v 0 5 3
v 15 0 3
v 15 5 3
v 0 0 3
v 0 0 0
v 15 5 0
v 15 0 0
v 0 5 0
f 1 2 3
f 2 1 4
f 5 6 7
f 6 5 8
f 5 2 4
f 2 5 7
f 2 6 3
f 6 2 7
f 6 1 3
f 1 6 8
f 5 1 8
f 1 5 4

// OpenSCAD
// Generated by SolidPython 1.0.1 on 2020-07-29 00:46:55


cube(size = [15, 5, 3]);
/***********************************************
*********      SolidPython code:      **********
************************************************
 
# import packages: SolidPython
from solid import *
from solid.utils import *
from itertools import chain, combinations, permutations


class Resize:

    def __init__(self, scad_file):
        self.scad_file = scad_file
        #self.scad_file = import_scad(scad_file)
        # cone/cylinder param:
        self.r1 = 0
        self.r2 = 0
        self.h = 0
        # rectangular prism param:
        self.w = 0
        self.l = 0
        # ellipse param:
        self.r = 0

    # import OpenScad code (file name corresponds to shape)


    # classify shape + parameters
    def assign(self, param1, param2, param3):
        if self.scad_file == 'cone.scad':
            self.r1 = param1
            self.r2 = param2
            self.h = param3
        elif self.scad_file == 'cylinder.scad':
            self.r1 = param1
            self.r2 = param2
            self.h = param3
        elif self.scad_file == 'rectangularPrism.scad':
            self.h = param1
            self.l = param2
            self.w = param3
        else:
            self.r = param1
            self.h = param2

    # resize parameters
    def iterate(self):
        x = range(3, 20, 2)
        i = 1
        if self.scad_file == 'cone.scad':
            tempList = list(permutations(x, 2))
            for temp in tempList:
                param1 = temp[0]
                param2 = temp[1]
                filepath = 'produced_scad_files/' + 'cone' + str(param1) + '_' + str(param2) + '_' + '.scad'
                scad_render_to_file(cylinder(h=param1, r1=param2, r2=0), filepath)

        elif self.scad_file == 'cylinder.scad':
            tempList = list(permutations(x, 3))
            for temp in tempList:
                param1 = temp[0]
                param2 = temp[1]
                filepath = 'produced_scad_files/' + 'cylinder' + str(param1) + '_' + str(param2) + '_' + '.scad'
                scad_render_to_file(cylinder(h=param1, r1=param2, r2=param2), filepath)

        elif self.scad_file == 'rectangularPrism.scad':
            tempList = list(permutations(x, 3))
            for temp in tempList:
                param1 = temp[0]
                param2 = temp[1]
                param3 = temp[2]
                filepath = 'produced_scad_files/' + 'rectangularPrism' + str(param1) + '_' + str(param2) + '_' + str(
                    param3) + '.scad'
                scad_render_to_file(cube(size=(param1, param2, param3)), filepath)

        elif self.scad_file == 'ellipse.scad':
            tempList = list(permutations(x, 4))
            for temp in tempList:
                param1 = temp[0]
                param2 = temp[1]
                param3 = temp[2]
                param4 = temp[3]
                filepath = 'produced_scad_files/' + 'ellipse' + str(param1) + '_' + str(param2) + '_' + str(param3) + '_' + str(param4) + '.scad'
                scad_render_to_file(scale([param1, param2, param3])(sphere(r=param4)), filepath)

    def render_to_scadfile(self):
        scad_render_to_file(scad, 'example.scad') 
 
************************************************/
